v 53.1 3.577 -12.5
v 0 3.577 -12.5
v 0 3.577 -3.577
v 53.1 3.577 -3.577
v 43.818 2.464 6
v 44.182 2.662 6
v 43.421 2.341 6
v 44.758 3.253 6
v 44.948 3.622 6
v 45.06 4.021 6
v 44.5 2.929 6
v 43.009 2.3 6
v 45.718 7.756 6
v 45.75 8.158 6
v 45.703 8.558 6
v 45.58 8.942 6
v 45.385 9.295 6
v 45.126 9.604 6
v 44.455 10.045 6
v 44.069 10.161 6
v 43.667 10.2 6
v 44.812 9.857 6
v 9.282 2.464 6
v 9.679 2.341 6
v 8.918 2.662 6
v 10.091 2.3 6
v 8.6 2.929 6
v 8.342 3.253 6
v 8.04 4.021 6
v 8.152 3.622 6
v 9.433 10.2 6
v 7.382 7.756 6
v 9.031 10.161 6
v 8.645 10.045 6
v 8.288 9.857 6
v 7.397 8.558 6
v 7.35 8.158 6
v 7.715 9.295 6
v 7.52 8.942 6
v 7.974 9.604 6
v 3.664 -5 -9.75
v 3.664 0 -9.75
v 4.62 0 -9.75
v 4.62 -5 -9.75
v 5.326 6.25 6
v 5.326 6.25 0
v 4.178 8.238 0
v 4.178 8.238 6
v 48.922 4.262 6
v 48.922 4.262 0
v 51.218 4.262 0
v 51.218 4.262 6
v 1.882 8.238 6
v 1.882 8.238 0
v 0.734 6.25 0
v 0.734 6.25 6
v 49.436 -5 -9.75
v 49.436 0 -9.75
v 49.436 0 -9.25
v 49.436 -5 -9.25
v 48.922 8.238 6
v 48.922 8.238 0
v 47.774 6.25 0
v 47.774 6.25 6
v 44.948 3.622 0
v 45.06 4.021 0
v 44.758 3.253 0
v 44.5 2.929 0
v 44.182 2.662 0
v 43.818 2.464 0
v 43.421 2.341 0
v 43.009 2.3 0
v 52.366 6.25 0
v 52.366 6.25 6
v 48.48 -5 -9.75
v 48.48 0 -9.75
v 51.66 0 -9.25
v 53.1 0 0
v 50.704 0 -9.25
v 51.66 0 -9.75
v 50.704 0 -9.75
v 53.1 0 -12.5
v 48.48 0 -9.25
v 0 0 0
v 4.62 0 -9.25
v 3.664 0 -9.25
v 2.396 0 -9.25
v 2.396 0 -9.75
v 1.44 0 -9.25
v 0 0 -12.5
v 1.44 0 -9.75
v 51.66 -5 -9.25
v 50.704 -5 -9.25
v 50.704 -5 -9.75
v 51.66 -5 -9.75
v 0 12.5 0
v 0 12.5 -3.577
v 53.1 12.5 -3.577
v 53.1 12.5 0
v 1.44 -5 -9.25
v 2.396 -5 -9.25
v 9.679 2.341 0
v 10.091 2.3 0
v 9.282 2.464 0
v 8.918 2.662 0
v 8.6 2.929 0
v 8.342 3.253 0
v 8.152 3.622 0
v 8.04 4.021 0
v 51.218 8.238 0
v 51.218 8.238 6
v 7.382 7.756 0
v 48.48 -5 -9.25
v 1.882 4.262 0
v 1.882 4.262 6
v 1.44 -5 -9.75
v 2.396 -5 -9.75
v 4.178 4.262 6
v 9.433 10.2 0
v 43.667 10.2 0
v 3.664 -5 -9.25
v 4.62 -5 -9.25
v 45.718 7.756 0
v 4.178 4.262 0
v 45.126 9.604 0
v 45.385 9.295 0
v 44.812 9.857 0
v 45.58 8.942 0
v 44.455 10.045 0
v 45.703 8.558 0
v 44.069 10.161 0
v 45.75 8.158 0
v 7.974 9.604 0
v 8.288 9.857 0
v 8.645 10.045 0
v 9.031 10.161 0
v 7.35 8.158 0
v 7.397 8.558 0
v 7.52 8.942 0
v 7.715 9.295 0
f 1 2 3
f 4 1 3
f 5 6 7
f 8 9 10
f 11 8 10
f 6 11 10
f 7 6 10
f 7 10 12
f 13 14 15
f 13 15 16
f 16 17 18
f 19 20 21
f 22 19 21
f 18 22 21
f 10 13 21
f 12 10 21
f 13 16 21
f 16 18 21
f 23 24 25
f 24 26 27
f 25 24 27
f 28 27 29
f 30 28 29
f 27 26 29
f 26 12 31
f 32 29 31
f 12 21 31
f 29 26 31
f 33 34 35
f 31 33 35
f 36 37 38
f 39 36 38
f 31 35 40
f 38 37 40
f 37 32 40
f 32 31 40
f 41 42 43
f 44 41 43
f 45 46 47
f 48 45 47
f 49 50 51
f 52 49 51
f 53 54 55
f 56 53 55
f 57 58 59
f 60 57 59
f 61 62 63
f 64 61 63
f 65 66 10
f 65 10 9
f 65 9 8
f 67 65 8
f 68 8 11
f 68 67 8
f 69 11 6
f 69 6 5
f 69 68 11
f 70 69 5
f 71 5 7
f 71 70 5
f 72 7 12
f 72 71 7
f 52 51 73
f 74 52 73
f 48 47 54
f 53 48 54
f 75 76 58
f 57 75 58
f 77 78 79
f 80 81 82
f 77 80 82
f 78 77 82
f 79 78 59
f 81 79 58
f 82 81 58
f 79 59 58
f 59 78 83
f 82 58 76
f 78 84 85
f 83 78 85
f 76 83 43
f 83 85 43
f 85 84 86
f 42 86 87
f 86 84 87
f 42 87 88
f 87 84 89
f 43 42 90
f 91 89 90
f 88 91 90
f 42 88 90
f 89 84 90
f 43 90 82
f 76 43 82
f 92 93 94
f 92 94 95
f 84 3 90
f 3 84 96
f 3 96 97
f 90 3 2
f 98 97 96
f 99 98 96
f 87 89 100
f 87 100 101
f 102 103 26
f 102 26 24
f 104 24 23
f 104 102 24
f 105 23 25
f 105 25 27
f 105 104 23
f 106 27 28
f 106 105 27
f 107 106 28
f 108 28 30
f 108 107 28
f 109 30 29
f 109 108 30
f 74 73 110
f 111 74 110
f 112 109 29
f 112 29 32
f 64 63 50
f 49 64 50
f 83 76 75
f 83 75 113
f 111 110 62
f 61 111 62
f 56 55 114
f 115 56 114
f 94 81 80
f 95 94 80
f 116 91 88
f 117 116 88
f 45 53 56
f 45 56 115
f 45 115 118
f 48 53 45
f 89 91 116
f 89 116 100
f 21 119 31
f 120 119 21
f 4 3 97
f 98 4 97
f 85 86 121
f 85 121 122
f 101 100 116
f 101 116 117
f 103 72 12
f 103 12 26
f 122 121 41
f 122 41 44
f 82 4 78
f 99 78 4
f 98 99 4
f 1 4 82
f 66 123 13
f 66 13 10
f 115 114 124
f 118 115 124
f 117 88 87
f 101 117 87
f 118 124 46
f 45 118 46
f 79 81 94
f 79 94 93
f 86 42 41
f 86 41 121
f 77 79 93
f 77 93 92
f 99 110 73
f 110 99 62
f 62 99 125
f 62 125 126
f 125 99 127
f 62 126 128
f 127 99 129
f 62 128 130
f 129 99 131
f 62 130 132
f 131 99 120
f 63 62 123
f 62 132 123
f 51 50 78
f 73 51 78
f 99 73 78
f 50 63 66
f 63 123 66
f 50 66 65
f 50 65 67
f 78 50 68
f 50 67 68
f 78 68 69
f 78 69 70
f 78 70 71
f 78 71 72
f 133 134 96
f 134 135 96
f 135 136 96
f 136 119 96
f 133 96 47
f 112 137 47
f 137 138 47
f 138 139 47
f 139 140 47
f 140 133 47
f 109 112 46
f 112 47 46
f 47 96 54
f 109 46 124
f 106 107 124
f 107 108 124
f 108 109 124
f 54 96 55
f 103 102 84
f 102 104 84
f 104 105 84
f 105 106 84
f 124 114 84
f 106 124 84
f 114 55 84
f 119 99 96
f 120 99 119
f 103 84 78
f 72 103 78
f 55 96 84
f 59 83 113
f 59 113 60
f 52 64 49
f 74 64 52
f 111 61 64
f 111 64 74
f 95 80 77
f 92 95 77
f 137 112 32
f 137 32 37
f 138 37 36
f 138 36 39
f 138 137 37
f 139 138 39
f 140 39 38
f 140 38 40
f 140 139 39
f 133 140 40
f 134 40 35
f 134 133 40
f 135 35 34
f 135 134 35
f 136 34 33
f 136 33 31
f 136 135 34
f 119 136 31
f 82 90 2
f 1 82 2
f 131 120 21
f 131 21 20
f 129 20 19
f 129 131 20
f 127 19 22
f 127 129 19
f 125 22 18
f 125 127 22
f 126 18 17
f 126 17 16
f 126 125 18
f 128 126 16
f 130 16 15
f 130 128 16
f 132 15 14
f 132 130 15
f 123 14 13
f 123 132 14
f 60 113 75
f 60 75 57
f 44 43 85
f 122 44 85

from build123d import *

# Parameters (mm, degrees)
BOSS_EXTRUDE1_DEPTH = 53.1
BOSS_EXTRUDE2_DEPTH = 6
SKETCH3_W           = 0.955506131
SKETCH3_H           = 0.5
BOSS_EXTRUDE3_DEPTH = 5
BOSS_EXTRUDE4_DEPTH = 6


with BuildPart() as part:
    # Sketch1 → Boss-Extrude1 (new body)
    with BuildSketch(Plane(origin=(0, 0, 0), x_dir=(0, 0, -1), z_dir=(1, 0, 0))):
        Polygon((0, 0), (12.5, 0), (12.5, 3.577441077), (3.577441077, 3.577441077), (3.577441077, 12.5), (0, 12.5), align=None)
    extrude(amount=BOSS_EXTRUDE1_DEPTH)

    # Sketch2 → Boss-Extrude2 (add)
    with BuildSketch(Plane.XY):
        with BuildLine():
            Line((9.4328, 10.2), (43.6672, 10.2))
            ThreePointArc((43.6672, 10.2), (45.262717366, 9.455998033), (45.718357588, 7.755525576))
            Line((45.718357588, 7.755525576), (45.059882111, 4.021125576))
            ThreePointArc((45.059882111, 4.021125576), (44.347522557, 2.787282634), (43.008724523, 2.3))
            Line((43.008724523, 2.3), (10.091275477, 2.3))
            ThreePointArc((10.091275477, 2.3), (8.752477443, 2.787282634), (8.040117889, 4.021125576))
            Line((8.040117889, 4.021125576), (7.381642412, 7.755525576))
            ThreePointArc((7.381642412, 7.755525576), (7.837282634, 9.455998033), (9.4328, 10.2))
        make_face()
    extrude(amount=BOSS_EXTRUDE2_DEPTH)

    # Sketch3 → Boss-Extrude3 (add)
    with BuildSketch(Plane.XZ):
        with Locations((1.917753066, -9.5)):
            Rectangle(SKETCH3_W, SKETCH3_H)
        with Locations((4.142246935, -9.5)):
            Rectangle(SKETCH3_W, SKETCH3_H)
        with Locations((48.957753066, -9.5)):
            Rectangle(SKETCH3_W, SKETCH3_H)
        with Locations((51.182246935, -9.5)):
            Rectangle(SKETCH3_W, SKETCH3_H)
    extrude(amount=BOSS_EXTRUDE3_DEPTH)

    # Sketch4 → Boss-Extrude4 (add)
    with BuildSketch(Plane.XY):
        Polygon((4.177995884, 4.261612802), (5.325991768, 6.25), (4.177995884, 8.238387198), (1.882004116, 8.238387198), (0.734008232, 6.25), (1.882004116, 4.261612802), align=None)
        Polygon((51.217995884, 4.261612802), (52.365991768, 6.25), (51.217995884, 8.238387198), (48.922004116, 8.238387198), (47.774008232, 6.25), (48.922004116, 4.261612802), align=None)
    extrude(amount=BOSS_EXTRUDE4_DEPTH)


solid = part.part
